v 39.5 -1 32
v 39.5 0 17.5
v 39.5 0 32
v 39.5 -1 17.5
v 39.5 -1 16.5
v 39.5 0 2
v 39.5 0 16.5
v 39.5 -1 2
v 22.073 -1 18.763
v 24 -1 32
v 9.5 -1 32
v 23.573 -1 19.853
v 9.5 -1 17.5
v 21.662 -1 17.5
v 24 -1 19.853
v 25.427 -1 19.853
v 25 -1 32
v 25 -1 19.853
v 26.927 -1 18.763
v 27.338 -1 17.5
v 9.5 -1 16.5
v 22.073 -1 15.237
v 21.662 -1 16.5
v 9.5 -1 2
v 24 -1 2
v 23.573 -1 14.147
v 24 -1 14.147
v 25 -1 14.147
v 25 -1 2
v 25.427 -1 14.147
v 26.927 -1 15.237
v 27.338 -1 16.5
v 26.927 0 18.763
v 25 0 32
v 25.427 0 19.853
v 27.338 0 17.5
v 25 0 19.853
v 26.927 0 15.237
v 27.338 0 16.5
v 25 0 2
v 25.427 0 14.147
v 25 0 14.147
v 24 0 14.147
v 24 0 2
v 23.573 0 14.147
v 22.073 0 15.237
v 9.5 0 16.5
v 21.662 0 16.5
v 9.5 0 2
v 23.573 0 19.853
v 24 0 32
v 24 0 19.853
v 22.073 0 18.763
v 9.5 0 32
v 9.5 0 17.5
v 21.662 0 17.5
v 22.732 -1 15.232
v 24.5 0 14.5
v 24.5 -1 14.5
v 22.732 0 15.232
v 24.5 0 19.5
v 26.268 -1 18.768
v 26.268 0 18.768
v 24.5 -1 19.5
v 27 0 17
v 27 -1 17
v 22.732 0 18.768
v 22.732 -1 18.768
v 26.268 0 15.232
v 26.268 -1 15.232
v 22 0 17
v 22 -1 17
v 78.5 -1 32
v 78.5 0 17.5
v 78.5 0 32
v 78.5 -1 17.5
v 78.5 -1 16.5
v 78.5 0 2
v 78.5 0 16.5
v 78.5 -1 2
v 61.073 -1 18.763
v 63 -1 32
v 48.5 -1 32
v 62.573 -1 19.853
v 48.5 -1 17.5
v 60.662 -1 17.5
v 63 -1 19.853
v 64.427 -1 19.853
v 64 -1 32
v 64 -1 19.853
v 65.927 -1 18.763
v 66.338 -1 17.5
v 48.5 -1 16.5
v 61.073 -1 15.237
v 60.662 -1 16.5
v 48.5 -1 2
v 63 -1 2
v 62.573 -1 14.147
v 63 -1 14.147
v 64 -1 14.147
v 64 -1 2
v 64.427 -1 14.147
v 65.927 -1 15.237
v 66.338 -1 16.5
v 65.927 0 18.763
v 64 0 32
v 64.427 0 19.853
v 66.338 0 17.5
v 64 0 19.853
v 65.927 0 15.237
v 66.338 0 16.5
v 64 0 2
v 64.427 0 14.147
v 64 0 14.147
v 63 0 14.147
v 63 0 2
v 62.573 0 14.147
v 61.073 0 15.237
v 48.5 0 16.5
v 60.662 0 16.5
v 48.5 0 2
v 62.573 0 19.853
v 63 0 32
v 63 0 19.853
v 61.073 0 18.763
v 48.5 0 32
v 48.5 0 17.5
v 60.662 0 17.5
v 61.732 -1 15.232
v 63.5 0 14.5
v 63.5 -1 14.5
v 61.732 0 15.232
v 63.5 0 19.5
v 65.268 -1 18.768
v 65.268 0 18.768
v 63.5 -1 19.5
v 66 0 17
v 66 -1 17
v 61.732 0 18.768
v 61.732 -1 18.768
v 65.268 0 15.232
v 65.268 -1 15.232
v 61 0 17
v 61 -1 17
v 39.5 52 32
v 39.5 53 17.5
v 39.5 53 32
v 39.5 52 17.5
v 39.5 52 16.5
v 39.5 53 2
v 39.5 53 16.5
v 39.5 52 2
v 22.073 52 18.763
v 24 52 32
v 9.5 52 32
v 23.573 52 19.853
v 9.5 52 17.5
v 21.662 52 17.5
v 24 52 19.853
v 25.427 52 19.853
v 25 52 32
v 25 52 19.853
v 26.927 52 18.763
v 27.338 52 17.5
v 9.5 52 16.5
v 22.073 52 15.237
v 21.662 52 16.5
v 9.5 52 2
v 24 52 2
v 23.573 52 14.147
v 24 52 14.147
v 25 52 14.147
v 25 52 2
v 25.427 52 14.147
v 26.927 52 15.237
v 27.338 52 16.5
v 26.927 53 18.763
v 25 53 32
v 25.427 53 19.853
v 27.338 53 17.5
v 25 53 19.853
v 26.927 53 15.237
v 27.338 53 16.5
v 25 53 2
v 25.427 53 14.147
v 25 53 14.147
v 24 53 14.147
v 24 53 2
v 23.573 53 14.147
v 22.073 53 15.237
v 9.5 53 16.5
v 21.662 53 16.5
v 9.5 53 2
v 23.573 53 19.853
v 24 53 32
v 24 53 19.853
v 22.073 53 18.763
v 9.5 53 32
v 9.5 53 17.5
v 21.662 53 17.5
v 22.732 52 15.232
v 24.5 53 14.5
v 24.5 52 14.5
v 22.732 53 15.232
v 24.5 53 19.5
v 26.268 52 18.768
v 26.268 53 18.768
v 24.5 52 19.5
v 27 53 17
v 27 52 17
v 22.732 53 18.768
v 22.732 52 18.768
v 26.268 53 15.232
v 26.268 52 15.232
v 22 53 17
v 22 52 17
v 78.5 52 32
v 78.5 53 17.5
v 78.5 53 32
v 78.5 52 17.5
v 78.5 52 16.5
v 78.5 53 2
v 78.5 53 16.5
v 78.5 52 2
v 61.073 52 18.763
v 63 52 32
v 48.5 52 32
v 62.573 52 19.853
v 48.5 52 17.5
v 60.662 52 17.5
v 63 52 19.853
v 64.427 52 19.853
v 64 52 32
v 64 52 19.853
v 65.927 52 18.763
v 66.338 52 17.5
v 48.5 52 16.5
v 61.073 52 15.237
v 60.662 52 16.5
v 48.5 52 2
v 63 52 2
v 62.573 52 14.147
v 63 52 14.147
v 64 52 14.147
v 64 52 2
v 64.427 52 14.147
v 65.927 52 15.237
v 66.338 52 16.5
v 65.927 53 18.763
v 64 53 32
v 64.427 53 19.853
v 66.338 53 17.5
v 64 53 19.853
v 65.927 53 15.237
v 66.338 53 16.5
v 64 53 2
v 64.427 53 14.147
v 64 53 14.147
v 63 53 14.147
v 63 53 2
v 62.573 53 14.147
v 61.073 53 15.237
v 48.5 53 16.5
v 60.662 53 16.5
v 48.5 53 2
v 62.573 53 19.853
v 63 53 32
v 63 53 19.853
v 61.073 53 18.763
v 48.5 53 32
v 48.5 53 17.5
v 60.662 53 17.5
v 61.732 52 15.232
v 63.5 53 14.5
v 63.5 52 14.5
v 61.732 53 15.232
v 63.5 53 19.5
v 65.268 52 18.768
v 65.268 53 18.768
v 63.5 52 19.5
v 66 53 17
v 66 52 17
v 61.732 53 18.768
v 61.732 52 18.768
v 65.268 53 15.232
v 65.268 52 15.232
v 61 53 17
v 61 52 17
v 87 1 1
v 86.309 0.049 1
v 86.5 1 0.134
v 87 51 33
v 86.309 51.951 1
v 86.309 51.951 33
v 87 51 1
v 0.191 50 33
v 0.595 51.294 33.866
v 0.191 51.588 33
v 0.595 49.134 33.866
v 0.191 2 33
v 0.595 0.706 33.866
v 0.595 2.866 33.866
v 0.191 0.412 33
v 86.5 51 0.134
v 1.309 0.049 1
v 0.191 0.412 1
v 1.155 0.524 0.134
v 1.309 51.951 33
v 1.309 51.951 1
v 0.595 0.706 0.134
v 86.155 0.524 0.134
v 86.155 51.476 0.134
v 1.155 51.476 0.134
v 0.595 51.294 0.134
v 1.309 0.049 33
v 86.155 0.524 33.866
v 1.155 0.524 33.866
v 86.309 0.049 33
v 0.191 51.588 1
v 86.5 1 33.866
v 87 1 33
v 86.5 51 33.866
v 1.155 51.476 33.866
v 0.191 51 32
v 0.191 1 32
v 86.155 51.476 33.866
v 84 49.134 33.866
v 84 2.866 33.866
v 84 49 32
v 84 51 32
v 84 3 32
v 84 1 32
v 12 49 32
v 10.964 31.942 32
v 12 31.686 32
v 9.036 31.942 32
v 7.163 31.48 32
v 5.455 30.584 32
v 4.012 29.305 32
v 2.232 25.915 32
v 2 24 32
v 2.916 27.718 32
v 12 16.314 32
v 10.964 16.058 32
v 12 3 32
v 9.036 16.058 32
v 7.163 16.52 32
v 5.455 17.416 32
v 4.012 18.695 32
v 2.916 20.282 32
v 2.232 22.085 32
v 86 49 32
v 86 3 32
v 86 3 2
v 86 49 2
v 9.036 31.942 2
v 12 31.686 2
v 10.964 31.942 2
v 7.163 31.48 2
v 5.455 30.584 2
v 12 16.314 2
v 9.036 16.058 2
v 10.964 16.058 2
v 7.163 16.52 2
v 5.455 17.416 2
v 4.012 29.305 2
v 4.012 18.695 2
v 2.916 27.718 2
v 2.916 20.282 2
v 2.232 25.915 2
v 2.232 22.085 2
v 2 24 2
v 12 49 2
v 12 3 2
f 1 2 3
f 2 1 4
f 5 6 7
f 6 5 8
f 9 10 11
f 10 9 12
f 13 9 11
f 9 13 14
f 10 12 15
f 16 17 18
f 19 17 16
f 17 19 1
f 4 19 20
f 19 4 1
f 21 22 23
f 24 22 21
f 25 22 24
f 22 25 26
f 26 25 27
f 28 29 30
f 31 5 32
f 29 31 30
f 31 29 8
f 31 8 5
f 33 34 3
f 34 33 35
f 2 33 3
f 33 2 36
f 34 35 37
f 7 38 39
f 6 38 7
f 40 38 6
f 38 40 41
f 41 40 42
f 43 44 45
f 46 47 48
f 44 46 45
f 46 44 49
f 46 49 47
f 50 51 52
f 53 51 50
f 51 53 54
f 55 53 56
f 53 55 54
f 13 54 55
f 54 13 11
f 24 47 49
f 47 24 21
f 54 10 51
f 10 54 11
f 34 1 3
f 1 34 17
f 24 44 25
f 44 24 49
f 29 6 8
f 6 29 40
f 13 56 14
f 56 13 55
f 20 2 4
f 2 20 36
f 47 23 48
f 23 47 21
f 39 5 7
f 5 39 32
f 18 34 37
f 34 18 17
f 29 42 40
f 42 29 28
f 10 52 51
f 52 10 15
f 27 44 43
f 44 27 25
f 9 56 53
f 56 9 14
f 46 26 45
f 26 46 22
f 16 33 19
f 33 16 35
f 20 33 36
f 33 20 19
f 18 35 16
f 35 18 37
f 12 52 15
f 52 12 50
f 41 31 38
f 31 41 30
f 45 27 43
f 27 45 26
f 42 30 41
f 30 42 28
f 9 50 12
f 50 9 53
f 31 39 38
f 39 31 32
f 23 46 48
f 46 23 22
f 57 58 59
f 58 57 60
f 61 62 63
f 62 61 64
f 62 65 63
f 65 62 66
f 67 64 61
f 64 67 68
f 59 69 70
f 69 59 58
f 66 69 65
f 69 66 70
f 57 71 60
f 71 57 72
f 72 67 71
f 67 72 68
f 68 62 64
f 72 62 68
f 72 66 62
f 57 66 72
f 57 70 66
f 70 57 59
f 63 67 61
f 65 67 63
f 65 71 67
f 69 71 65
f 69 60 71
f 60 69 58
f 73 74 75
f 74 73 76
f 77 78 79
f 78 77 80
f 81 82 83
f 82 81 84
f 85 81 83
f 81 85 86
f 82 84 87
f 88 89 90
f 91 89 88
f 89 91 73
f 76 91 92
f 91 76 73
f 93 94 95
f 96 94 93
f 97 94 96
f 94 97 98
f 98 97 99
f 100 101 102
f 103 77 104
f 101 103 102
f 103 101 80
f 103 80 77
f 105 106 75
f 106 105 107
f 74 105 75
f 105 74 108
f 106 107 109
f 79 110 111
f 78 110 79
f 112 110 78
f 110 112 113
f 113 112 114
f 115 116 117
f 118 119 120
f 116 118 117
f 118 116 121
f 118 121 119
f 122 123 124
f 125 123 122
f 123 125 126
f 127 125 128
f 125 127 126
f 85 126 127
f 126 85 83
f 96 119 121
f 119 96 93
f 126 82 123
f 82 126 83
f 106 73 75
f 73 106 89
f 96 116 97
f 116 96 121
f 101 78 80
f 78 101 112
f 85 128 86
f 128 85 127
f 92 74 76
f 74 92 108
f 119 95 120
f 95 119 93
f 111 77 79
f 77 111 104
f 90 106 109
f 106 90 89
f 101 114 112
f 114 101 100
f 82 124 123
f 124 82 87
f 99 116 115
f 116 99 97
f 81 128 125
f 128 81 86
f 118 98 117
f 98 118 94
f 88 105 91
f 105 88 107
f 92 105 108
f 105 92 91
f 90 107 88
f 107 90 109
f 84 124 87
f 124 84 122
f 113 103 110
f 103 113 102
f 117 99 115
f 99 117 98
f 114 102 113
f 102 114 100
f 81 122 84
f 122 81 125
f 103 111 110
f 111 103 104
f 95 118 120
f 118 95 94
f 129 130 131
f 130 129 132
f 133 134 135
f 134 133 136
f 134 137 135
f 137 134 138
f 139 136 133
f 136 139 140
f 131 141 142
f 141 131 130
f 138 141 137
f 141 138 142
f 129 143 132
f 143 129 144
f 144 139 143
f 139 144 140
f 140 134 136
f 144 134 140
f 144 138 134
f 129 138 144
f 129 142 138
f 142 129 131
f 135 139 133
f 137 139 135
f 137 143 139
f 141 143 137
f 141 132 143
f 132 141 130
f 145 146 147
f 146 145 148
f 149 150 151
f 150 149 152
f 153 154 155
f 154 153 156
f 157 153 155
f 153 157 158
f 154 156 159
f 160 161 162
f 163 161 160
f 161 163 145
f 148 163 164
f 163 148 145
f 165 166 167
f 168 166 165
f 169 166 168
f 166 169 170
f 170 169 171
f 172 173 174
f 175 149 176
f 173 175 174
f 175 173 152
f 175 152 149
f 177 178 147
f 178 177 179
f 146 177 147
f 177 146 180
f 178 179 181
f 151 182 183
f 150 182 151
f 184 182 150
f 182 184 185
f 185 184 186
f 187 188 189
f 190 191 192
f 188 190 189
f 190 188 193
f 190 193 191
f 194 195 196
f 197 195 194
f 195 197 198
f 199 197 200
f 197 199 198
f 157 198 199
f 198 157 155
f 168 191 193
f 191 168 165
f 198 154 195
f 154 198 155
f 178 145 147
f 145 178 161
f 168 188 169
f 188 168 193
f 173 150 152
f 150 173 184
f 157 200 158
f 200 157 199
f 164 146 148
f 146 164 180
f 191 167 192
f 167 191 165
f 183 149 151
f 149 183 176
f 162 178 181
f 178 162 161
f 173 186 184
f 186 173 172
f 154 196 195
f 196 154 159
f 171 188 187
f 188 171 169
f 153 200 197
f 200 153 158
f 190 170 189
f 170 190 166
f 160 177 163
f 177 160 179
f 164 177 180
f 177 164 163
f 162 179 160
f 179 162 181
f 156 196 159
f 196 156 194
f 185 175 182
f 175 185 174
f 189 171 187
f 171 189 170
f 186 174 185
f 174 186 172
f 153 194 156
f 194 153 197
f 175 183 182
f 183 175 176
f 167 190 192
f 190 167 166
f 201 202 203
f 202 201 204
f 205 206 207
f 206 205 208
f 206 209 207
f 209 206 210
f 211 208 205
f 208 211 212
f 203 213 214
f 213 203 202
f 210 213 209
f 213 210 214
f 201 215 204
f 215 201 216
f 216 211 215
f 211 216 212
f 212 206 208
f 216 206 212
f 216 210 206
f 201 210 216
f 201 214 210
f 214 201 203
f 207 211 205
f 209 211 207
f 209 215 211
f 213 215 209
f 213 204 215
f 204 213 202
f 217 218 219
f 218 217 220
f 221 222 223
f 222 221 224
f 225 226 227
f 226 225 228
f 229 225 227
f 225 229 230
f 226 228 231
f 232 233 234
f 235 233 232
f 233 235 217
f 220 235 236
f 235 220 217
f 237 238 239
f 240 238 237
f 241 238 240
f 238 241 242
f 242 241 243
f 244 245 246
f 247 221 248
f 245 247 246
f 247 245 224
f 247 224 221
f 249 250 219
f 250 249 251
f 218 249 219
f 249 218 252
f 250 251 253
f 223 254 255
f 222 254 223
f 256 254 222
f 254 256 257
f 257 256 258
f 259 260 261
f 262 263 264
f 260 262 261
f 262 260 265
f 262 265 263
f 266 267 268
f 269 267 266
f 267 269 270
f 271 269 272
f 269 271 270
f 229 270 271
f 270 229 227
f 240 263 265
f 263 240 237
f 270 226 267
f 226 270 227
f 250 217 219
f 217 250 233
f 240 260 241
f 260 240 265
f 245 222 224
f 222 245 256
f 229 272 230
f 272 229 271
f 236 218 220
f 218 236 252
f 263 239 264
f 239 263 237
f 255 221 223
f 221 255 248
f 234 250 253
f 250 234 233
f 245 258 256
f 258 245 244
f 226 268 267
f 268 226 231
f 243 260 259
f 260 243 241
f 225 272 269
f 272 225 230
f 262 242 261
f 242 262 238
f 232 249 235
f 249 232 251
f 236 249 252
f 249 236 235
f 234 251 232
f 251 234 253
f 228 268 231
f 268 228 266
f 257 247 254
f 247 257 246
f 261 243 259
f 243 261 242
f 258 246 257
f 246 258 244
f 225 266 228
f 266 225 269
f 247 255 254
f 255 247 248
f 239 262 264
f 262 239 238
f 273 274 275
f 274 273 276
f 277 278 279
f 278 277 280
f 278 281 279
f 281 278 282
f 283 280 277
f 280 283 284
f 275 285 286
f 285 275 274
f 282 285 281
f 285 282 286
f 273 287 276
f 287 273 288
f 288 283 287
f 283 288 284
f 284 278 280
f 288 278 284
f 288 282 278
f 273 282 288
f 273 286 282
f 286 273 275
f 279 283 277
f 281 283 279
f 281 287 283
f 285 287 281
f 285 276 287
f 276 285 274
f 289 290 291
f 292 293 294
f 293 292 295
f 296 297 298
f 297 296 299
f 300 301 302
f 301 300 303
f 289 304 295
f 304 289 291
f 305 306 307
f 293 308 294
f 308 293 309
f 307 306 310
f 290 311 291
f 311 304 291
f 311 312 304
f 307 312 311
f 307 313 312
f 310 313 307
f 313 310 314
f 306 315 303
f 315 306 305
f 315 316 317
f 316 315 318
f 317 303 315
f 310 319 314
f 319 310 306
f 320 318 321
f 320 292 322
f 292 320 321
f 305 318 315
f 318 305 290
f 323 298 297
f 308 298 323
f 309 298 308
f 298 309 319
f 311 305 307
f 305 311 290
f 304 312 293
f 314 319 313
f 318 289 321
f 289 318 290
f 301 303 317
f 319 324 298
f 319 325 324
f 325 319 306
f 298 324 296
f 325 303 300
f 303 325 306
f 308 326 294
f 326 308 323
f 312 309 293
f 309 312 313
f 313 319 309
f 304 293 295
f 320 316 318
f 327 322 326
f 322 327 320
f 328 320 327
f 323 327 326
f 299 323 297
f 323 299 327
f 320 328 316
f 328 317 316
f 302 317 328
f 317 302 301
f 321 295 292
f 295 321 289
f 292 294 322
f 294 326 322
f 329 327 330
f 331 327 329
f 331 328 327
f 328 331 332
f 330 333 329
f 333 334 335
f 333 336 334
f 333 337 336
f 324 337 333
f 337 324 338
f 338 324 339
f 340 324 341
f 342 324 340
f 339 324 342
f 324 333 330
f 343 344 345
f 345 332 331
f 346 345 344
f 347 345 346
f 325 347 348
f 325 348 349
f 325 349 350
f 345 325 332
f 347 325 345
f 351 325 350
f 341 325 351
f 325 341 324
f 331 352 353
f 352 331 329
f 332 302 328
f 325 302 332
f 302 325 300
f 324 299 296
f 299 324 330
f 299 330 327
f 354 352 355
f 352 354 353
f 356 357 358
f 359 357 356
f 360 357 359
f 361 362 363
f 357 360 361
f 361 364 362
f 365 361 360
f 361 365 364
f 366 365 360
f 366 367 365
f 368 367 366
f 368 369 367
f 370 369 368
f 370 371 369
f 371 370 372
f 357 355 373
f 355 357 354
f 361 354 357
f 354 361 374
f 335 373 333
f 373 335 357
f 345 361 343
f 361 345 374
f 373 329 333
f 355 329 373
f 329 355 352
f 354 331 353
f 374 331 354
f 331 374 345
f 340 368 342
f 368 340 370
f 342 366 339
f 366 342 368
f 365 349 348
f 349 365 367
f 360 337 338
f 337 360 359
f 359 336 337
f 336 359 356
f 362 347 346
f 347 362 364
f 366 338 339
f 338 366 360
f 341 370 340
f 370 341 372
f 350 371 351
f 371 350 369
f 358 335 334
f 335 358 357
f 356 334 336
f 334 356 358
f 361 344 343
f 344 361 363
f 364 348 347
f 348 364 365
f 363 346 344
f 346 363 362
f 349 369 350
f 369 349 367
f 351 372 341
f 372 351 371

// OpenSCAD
module panel(x,y,z)
{
    translate([x,y,z]) rotate([90,0,0]) {
    difference() {
        cube([30,30,1]);
        translate([0,14.5,0]) cube([30,1,1]);
        translate([14.5,0,0]) cube([1,30,1]);
        translate([15,15,0]) cylinder(h=1,r=3);
    }
    translate([15,15,0]) cylinder(h=1,r=2.5);
    }
}

l=84;
w=48;
h=30;
t=2;
difference() 
{
    union() {
        hull() {
        translate([1,1,1]) sphere(r=1);
        translate([1,1,h+t+1]) sphere(r=1);
        translate([l+t,1,h+t+1]) sphere(r=1);
        translate([l+t,1,1]) sphere(r=1);
        translate([1,w+t+1,1]) sphere(r=1);
        translate([1,w+t+1,h+t+1]) sphere(r=1);
        translate([l+t,w+t+1,h+t+1]) sphere(r=1);
        translate([l+t,w+t+1,1]) sphere(r=1);
        }
        panel(9.5,0,2);
        panel(48.5,0,2);
        panel(9.5,53,2);
        panel(48.5,53,2);
    }
    translate([t+10,t+1,t]) cube([l-10,w-2,h]);
    translate([0,t/2,h+t]) {
        difference() {
            cube([l,w+t,t+1]);
            rotate([45,0,0]) cube([l,2*t,2*t]);
            translate([0,w+t,0]) rotate([45,0,0]) cube([l,2*t,2*t]);
        }
    }
    translate([10,w/2,t]) cylinder(r=8,h=h);
}

/*translate([0,t,50]) {
    difference() {
    cube([l,w,t]);
    rotate([45,0,0]) cube([l,2*t,2*t]);
    translate([0,w,0]) rotate([45,0,0]) cube([l,2*t,2*t]);
    }
}*/
